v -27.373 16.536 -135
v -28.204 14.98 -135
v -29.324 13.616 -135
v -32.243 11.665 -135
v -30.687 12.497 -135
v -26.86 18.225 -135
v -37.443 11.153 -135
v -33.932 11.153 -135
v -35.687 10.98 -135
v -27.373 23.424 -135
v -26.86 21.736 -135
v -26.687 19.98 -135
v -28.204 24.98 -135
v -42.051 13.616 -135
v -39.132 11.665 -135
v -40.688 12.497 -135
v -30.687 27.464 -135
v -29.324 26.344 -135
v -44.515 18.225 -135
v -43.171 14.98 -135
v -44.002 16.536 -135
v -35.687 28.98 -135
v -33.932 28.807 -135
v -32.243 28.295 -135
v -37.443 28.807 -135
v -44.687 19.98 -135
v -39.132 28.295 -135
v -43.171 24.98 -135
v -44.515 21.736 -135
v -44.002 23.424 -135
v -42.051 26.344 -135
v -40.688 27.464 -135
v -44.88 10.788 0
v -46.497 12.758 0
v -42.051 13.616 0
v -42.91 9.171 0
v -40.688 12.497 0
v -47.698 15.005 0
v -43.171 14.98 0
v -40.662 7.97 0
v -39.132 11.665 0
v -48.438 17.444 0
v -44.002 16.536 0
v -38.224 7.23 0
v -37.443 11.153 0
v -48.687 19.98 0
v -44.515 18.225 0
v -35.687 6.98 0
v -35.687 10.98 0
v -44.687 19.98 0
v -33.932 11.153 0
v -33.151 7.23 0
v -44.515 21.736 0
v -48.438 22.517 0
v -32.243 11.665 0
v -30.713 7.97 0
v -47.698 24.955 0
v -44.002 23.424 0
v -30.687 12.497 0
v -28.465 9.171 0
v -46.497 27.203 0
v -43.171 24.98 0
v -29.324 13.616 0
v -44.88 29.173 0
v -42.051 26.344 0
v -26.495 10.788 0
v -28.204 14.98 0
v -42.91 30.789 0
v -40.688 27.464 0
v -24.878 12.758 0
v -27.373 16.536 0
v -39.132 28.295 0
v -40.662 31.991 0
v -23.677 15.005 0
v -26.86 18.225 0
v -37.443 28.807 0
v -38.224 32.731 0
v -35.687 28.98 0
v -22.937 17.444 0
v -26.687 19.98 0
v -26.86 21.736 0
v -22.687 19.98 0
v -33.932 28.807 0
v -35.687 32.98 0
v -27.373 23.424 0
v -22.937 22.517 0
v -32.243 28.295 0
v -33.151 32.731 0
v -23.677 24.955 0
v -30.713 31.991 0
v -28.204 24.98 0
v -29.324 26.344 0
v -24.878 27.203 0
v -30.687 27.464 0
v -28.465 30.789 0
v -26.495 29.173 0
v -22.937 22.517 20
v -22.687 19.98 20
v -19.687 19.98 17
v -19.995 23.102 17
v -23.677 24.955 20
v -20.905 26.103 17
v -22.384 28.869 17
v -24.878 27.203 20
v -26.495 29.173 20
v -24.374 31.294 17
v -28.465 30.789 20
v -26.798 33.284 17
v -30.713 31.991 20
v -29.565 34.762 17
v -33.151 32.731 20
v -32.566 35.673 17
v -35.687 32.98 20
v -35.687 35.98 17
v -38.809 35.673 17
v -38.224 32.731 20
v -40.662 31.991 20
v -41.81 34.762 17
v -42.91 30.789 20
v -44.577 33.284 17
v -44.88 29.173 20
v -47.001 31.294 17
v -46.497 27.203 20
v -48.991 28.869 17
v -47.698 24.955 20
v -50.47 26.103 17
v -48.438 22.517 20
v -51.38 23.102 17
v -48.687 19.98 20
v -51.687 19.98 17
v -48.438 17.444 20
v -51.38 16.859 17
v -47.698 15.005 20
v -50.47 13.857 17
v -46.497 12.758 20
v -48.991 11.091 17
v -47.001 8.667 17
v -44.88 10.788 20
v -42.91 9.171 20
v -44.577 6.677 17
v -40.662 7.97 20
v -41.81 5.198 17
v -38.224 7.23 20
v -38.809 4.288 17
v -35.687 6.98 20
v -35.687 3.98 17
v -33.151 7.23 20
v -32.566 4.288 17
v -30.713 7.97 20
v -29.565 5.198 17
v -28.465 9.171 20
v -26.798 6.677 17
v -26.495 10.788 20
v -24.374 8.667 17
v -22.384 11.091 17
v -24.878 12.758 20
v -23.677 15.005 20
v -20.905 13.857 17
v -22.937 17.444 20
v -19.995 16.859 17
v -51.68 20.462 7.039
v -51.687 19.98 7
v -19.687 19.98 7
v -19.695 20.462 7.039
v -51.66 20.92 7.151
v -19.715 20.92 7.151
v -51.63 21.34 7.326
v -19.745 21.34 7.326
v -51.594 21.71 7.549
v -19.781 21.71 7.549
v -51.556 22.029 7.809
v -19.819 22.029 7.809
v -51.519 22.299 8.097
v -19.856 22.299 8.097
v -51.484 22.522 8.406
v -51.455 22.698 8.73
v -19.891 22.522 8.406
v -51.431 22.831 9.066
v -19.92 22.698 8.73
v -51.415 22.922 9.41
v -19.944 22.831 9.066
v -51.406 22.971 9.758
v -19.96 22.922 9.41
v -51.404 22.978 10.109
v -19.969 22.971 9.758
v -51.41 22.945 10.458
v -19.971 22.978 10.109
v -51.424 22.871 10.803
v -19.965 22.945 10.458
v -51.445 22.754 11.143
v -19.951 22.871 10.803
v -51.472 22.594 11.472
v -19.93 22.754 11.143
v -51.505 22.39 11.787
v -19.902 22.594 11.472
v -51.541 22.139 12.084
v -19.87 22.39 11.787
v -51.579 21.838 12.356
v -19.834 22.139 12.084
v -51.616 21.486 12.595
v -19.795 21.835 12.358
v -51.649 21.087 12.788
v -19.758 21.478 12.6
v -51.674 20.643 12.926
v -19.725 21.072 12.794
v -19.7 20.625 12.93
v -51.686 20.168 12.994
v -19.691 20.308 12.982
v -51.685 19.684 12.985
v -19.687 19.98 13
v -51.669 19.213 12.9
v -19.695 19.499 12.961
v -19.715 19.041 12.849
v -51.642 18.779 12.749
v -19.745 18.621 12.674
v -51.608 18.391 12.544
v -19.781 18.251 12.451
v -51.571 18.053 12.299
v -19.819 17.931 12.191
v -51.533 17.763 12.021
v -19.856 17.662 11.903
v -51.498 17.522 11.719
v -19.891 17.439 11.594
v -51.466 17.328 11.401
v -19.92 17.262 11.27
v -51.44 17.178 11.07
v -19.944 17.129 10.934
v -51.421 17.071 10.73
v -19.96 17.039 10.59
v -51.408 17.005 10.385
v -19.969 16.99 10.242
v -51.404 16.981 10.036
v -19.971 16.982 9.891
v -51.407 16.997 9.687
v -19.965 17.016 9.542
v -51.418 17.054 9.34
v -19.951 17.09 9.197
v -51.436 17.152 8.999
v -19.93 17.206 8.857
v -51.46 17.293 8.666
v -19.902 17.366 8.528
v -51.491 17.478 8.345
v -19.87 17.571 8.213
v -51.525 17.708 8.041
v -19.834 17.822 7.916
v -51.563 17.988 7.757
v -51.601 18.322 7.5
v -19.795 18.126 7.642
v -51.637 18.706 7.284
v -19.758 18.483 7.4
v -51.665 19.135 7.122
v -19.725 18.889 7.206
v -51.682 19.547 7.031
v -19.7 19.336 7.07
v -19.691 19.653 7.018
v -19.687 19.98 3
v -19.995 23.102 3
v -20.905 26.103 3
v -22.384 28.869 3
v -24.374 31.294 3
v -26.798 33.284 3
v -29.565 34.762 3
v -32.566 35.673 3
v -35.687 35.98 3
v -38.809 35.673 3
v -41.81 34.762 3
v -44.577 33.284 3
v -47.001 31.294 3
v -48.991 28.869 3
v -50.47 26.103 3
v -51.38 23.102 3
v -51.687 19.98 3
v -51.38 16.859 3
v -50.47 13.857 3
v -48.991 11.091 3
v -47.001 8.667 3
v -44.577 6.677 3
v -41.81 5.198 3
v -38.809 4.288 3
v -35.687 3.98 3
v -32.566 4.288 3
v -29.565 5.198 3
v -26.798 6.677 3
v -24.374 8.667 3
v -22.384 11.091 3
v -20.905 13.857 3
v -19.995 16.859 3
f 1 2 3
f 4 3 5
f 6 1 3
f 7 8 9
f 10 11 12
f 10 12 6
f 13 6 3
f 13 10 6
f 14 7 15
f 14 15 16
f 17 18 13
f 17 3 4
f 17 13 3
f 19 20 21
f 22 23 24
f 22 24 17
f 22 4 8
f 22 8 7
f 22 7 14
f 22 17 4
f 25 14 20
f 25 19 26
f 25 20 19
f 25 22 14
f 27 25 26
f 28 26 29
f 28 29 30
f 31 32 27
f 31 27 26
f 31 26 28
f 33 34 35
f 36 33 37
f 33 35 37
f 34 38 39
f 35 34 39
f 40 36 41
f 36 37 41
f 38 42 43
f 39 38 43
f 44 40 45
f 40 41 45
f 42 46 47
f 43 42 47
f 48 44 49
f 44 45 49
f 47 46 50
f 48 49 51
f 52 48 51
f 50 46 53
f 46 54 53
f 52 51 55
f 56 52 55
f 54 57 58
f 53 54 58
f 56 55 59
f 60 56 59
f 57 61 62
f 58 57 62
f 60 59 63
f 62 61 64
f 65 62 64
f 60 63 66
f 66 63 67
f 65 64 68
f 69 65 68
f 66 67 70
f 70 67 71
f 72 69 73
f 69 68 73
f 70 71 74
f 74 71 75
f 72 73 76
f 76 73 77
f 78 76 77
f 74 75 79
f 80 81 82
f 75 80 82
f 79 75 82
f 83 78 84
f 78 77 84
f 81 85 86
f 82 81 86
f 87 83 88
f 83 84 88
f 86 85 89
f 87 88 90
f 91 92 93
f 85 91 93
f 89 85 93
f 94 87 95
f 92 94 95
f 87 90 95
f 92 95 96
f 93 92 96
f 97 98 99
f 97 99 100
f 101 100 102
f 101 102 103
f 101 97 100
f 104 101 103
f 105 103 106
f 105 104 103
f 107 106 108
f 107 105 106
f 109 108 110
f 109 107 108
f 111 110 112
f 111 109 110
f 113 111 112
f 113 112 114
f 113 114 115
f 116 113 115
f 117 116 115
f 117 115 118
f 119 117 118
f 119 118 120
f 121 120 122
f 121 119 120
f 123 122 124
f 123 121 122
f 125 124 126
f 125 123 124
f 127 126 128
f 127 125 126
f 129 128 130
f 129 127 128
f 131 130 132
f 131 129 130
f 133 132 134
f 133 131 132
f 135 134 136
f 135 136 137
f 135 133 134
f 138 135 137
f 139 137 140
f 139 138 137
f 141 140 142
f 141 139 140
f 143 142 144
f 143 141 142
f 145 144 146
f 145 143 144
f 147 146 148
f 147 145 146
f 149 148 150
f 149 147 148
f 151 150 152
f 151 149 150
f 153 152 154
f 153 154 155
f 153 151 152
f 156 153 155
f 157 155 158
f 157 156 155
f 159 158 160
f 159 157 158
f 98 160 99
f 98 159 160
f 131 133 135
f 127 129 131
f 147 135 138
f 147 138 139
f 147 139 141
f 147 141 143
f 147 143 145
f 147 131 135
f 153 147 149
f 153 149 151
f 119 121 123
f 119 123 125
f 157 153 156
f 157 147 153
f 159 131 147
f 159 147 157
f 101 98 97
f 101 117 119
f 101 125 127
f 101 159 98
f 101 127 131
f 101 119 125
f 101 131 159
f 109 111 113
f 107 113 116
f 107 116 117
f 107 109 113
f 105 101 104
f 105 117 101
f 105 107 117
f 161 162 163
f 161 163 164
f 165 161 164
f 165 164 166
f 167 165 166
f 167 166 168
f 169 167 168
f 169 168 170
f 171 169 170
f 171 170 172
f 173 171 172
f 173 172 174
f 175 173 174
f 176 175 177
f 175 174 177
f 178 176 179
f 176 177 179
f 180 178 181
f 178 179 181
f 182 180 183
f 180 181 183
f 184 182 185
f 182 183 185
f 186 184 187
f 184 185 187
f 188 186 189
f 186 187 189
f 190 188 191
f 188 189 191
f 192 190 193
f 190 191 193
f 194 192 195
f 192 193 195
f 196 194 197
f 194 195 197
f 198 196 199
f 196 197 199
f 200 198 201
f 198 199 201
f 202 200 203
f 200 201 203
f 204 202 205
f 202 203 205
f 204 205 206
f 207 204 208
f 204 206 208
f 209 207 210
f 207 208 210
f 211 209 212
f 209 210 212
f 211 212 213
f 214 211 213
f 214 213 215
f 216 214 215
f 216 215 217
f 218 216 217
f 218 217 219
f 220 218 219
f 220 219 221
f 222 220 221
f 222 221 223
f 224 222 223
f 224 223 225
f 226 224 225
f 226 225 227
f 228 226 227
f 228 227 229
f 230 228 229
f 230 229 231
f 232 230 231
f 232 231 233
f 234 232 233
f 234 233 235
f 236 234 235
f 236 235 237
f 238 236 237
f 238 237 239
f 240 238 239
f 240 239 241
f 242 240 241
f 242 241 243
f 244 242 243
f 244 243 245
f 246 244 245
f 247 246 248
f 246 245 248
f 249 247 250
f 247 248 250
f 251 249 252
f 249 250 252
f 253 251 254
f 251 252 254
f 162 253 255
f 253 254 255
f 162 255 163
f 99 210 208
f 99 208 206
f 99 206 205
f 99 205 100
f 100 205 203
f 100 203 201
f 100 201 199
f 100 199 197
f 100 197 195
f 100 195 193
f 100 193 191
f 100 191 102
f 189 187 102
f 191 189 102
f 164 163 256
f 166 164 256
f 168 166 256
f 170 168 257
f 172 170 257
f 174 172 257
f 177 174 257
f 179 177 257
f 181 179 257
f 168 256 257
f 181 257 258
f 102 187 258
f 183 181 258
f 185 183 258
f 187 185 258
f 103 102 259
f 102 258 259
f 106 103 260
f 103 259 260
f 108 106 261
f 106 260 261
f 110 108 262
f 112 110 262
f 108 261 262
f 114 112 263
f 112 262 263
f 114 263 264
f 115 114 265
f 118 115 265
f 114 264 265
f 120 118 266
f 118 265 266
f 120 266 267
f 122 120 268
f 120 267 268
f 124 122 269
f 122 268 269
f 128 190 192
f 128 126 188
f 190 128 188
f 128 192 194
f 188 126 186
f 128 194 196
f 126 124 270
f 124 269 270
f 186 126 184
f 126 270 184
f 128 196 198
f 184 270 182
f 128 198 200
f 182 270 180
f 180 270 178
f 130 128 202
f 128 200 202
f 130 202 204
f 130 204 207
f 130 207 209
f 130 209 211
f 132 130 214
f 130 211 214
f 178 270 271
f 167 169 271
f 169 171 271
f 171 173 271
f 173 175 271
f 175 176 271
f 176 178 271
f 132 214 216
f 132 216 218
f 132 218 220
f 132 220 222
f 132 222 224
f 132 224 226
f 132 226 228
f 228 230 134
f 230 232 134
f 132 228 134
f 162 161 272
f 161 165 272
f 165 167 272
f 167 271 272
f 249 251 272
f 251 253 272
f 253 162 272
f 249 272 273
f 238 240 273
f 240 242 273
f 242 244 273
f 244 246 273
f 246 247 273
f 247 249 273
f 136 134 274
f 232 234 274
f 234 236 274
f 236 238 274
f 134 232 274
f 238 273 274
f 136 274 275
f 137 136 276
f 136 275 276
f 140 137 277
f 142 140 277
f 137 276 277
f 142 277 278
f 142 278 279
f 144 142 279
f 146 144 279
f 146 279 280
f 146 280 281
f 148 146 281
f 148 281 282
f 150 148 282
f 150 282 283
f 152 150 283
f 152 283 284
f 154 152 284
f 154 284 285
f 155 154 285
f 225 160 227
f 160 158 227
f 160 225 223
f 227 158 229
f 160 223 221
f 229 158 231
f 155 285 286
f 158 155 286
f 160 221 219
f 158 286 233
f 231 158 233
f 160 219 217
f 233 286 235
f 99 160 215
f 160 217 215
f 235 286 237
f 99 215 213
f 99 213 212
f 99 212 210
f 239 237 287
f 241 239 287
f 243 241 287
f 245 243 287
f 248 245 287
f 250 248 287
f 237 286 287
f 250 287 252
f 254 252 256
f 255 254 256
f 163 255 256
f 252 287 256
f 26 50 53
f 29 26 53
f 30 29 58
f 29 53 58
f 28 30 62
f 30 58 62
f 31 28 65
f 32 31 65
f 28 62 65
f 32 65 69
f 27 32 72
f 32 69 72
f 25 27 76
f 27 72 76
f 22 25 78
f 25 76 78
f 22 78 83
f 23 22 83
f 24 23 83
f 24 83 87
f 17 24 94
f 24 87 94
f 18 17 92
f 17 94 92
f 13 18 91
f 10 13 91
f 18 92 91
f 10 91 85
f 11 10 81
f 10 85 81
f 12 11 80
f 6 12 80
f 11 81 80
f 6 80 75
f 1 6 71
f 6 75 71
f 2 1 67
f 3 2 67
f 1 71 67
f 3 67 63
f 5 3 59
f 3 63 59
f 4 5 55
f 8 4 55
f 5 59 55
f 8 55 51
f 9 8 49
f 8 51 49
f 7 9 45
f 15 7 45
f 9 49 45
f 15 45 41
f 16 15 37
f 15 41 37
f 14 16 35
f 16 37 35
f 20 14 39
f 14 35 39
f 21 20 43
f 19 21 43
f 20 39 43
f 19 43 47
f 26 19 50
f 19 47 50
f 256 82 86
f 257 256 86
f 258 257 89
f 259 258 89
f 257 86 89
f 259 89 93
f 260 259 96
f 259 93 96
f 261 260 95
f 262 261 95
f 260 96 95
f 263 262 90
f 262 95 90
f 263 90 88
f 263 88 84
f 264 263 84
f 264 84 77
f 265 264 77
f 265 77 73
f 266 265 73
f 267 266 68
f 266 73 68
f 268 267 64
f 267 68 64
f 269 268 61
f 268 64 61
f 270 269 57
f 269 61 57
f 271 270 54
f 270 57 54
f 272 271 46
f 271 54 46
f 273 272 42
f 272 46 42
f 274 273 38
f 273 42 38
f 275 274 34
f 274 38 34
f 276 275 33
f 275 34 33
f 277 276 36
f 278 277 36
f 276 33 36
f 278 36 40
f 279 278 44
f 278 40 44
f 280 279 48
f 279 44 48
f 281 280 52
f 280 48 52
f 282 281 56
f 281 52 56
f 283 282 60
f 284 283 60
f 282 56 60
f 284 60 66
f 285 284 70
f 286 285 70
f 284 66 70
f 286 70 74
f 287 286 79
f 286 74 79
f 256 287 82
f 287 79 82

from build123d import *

# Parameters (mm, degrees)
IZIM1_R                     = 16
Y_KSEKLIK_EKSTR_ZYON1_DEPTH = 20
PAH2_SIZE                   = 3
PAH3_SIZE                   = 3
IZIM2_R                     = 9
Y_KSEKLIK_EKSTR_ZYON2_DEPTH = 135
IZIM3_R                     = 3
KES_EKSTR_ZYON1_DEPTH       = 149.967052528


with BuildPart() as part:
    # Çizim1 → Yükseklik-Ekstrüzyon1 (new body)
    with BuildSketch(Plane.XY):
        with Locations((-35.687497372, 19.980346779)):
            Circle(IZIM1_R)
    extrude(amount=Y_KSEKLIK_EKSTR_ZYON1_DEPTH)

    # Pah2
    pah2_edges = [part.edges().sort_by_distance(p)[0] for p in [
        (-51.687497372, 19.980346779, 20),
    ]]
    chamfer(pah2_edges, length=PAH2_SIZE)

    # Pah3
    pah3_edges = [part.edges().sort_by_distance(p)[0] for p in [
        (-51.687497372, 19.980346779, 0),
    ]]
    chamfer(pah3_edges, length=PAH3_SIZE)

    # Çizim2 → Yükseklik-Ekstrüzyon2 (add)
    with BuildSketch(Plane(origin=(0, 0, 0), x_dir=(-1, 0, 0), z_dir=(0, 0, -1))):
        with Locations((35.687497372, 19.980346779)):
            Circle(IZIM2_R)
    extrude(amount=Y_KSEKLIK_EKSTR_ZYON2_DEPTH)

    # Çizim3 → Kes-Ekstrüzyon1 (cut, through all)
    with BuildSketch(Plane(origin=(0, 0, 0), x_dir=(0, 0, -1), z_dir=(1, 0, 0))):
        with Locations((-10, 19.980346779)):
            Circle(IZIM3_R)
    extrude(amount=-KES_EKSTR_ZYON1_DEPTH, mode=Mode.SUBTRACT)


solid = part.part
